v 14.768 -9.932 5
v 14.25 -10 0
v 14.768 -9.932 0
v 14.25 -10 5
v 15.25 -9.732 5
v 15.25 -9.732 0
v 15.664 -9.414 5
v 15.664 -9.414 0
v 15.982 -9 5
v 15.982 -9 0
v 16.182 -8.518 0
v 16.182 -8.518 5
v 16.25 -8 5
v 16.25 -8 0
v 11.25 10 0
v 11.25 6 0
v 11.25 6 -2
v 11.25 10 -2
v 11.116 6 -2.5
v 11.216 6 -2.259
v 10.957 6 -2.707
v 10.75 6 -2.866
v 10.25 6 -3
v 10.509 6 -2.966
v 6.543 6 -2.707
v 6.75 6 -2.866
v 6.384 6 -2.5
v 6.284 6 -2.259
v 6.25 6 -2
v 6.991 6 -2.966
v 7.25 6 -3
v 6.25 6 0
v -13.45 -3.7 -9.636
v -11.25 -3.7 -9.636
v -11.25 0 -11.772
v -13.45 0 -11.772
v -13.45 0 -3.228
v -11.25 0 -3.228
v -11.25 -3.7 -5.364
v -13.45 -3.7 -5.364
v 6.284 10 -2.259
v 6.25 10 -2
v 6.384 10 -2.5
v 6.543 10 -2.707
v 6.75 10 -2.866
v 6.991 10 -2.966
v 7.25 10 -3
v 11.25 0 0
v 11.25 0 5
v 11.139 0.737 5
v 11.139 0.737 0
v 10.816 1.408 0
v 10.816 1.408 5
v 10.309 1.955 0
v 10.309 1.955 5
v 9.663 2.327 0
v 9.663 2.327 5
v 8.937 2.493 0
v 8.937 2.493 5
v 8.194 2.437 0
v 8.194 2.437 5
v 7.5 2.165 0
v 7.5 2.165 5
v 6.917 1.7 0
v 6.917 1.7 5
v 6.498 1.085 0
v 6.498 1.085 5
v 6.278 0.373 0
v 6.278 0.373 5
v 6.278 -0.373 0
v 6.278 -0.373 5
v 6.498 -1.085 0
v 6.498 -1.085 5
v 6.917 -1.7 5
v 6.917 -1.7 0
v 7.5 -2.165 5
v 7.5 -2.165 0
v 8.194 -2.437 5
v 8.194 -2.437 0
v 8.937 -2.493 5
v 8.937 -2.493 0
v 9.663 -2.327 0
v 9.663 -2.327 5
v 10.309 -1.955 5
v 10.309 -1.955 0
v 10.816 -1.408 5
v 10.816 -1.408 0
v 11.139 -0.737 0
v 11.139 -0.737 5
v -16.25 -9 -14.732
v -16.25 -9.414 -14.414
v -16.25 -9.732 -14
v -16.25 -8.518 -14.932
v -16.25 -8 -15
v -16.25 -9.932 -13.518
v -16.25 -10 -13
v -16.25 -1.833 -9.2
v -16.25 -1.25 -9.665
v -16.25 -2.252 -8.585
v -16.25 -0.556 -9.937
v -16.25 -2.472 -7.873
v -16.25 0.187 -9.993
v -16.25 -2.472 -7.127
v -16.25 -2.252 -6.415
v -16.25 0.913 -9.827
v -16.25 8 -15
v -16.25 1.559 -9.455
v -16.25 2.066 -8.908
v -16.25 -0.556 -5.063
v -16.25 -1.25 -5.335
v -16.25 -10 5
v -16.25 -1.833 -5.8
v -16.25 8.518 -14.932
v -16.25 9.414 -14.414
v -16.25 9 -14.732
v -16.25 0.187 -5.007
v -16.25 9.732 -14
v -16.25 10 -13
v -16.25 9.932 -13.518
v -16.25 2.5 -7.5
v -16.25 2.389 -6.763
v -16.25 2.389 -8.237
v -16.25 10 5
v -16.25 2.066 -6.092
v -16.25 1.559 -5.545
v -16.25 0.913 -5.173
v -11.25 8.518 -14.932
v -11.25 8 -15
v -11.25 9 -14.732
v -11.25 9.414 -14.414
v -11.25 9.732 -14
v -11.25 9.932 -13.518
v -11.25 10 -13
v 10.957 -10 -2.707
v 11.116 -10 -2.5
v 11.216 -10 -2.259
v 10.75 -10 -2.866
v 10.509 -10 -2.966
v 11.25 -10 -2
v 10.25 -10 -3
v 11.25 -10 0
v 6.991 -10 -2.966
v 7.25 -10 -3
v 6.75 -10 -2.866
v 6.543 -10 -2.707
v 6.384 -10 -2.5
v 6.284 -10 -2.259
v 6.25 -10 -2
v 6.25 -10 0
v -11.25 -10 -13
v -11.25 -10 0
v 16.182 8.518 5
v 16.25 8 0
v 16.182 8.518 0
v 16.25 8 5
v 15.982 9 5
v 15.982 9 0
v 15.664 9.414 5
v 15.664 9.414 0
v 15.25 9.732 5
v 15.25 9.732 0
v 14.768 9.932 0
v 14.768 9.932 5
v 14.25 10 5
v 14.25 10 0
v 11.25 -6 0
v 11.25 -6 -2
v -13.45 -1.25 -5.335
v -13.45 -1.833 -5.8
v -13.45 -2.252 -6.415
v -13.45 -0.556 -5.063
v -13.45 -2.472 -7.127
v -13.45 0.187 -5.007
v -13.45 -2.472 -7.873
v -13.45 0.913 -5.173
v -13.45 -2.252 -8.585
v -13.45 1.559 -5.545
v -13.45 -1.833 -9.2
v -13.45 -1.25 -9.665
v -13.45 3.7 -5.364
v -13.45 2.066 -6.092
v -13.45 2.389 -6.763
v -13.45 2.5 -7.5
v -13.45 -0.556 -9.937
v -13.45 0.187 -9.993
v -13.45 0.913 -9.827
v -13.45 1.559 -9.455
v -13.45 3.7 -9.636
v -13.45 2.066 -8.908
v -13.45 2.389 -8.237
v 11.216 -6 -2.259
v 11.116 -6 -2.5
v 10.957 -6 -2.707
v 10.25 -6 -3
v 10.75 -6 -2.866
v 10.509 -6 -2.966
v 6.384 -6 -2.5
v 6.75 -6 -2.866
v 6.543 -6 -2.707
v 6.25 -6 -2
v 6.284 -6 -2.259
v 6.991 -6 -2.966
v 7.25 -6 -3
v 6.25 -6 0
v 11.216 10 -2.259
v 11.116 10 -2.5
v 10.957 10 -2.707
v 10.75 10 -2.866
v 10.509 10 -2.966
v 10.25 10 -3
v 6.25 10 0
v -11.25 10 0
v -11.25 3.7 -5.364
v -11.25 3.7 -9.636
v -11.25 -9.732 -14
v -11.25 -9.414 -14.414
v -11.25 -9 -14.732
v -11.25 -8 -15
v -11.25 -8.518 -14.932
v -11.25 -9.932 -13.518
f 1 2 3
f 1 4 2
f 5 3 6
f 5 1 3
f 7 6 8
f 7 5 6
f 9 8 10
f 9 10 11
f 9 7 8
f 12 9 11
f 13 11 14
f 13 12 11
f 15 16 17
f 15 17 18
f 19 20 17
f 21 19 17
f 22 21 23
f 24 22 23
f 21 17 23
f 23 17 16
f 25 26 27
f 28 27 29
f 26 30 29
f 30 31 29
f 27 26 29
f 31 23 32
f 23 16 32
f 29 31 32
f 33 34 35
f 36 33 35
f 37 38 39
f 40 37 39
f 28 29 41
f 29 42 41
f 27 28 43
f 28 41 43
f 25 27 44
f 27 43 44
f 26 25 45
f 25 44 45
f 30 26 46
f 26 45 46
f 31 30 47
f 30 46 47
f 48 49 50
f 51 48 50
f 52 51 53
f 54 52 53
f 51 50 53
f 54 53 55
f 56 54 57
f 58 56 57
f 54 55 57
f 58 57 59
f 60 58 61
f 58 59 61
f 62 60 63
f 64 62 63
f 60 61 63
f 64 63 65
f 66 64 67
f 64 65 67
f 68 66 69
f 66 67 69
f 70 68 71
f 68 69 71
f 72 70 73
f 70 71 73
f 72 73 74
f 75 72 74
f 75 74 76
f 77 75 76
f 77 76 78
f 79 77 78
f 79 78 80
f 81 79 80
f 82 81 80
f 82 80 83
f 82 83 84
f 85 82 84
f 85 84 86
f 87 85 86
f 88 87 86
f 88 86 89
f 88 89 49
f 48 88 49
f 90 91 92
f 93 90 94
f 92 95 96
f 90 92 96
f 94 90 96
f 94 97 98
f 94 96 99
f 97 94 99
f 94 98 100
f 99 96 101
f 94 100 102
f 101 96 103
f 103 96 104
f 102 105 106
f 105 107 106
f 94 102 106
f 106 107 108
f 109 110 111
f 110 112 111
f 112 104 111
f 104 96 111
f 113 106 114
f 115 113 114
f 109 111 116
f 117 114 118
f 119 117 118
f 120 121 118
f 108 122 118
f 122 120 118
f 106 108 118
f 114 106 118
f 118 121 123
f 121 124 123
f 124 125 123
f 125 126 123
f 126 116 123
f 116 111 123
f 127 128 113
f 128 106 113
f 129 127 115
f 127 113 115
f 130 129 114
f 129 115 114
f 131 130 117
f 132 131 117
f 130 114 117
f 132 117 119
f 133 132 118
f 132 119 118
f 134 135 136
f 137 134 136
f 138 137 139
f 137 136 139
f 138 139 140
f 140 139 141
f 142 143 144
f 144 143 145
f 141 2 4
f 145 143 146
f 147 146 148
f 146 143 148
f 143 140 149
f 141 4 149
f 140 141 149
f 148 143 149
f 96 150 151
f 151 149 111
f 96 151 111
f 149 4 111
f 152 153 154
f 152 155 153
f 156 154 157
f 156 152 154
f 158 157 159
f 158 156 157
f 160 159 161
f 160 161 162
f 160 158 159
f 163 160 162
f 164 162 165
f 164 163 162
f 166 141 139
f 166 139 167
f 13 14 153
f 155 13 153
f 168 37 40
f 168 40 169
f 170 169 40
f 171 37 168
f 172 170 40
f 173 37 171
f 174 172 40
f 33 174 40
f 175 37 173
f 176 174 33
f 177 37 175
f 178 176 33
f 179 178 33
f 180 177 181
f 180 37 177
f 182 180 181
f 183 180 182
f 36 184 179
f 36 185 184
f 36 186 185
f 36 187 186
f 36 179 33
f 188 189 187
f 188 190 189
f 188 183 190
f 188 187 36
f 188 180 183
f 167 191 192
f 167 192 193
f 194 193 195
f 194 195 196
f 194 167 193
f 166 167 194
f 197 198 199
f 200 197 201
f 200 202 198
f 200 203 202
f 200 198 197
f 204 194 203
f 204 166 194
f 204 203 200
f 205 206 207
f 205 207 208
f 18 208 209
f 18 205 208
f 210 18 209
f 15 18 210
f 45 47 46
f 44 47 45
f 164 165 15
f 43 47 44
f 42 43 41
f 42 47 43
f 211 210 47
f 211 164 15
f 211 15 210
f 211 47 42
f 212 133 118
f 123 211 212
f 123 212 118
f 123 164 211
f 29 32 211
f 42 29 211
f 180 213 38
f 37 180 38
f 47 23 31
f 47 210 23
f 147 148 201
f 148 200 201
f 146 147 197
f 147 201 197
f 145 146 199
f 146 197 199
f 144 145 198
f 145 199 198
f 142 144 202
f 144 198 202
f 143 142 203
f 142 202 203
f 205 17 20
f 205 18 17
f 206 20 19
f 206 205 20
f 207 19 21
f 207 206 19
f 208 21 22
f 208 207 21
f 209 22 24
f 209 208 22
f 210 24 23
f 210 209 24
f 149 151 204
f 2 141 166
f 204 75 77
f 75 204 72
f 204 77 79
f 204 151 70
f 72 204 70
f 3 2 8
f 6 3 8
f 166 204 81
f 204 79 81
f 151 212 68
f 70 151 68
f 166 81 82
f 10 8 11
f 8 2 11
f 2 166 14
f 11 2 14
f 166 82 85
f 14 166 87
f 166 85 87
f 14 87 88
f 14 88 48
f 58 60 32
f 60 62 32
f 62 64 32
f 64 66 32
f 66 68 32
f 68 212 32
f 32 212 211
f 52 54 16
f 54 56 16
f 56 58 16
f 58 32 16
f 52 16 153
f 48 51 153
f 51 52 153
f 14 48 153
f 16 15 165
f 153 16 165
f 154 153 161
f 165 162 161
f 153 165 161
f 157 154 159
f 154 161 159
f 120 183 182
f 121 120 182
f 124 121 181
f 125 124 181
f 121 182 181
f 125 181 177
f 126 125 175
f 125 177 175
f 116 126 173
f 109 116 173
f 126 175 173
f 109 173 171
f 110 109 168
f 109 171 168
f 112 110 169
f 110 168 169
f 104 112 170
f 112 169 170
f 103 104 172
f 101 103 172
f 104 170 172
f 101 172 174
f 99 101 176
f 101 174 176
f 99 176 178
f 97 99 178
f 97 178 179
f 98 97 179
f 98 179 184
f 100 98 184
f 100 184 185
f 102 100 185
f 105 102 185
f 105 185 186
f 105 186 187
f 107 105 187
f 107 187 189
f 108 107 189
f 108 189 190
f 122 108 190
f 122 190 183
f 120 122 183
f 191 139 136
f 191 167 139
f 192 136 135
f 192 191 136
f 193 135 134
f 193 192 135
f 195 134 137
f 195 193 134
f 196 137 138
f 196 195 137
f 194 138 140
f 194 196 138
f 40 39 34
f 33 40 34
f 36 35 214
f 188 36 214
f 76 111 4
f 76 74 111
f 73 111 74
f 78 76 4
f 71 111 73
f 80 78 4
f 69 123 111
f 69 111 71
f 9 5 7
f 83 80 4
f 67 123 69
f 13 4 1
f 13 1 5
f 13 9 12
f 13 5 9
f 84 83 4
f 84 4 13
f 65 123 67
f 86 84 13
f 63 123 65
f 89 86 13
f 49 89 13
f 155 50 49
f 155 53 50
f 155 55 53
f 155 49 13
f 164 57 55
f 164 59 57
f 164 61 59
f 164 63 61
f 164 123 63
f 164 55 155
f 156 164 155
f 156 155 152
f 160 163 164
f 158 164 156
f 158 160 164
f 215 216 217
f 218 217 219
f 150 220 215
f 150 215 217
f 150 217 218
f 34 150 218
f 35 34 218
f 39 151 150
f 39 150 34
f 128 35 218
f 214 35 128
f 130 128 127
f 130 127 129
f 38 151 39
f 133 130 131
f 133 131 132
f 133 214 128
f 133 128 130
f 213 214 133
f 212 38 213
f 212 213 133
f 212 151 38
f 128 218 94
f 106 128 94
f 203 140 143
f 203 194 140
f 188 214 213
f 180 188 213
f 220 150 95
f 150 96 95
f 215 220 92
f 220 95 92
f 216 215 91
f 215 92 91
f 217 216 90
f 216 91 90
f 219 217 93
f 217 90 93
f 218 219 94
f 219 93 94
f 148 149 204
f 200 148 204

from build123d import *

# Parameters (mm, degrees)
SKETCH1_W           = 32.5
SKETCH1_H           = 20
BOSS_EXTRUDE1_DEPTH = 5
SKETCH2_W           = 5
SKETCH2_H           = 20
BOSS_EXTRUDE2_DEPTH = 15
SKETCH3_R           = 2.5
CUT_EXTRUDE1_DEPTH  = 15
SKETCH4_R           = 2.5
CUT_EXTRUDE2_DEPTH  = 15
SKETCH5_W           = 5
SKETCH5_H           = 4
BOSS_EXTRUDE3_DEPTH = 3
FILLET1_R           = 1
FILLET2_R           = 2
CUT_EXTRUDE3_DEPTH  = 2.2


with BuildPart() as part:
    # Sketch1 → Boss-Extrude1 (new body)
    with BuildSketch(Plane.XY):
        Rectangle(SKETCH1_W, SKETCH1_H)
    extrude(amount=BOSS_EXTRUDE1_DEPTH)

    # Sketch2 → Boss-Extrude2 (add)
    with BuildSketch(Plane(origin=(0, 0, 0), x_dir=(-1, 0, 0), z_dir=(0, 0, -1))):
        with Locations((13.75, 0)):
            Rectangle(SKETCH2_W, SKETCH2_H)
    extrude(amount=BOSS_EXTRUDE2_DEPTH)

    # Sketch3 → Cut-Extrude1 (cut)
    with BuildSketch(Plane(origin=(-11.25, 0, 0), x_dir=(0, 0, -1), z_dir=(1, 0, 0))):
        with Locations(Location((7.5, 0, 0), (0, 0, 90))):
            Circle(SKETCH3_R)
    extrude(amount=-CUT_EXTRUDE1_DEPTH, mode=Mode.SUBTRACT)

    # Sketch4 → Cut-Extrude2 (cut)
    with BuildSketch(Plane.XY.offset(5)):
        with Locations((8.75, 0)):
            Circle(SKETCH4_R)
    extrude(amount=-CUT_EXTRUDE2_DEPTH, mode=Mode.SUBTRACT)

    # Sketch5 → Boss-Extrude3 (add)
    with BuildSketch(Plane(origin=(0, 0, 0), x_dir=(-1, 0, 0), z_dir=(0, 0, -1))):
        with Locations((-8.75, 8)):
            Rectangle(SKETCH5_W, SKETCH5_H)
        with Locations((-8.75, -8)):
            Rectangle(SKETCH5_W, SKETCH5_H)
    extrude(amount=BOSS_EXTRUDE3_DEPTH)

    # Fillet1
    fillet1_edges = [part.edges().sort_by_distance(p)[0] for p in [
        (11.25, 8, -3),
        (6.25, 8, -3),
        (6.25, -8, -3),
        (11.25, -8, -3),
    ]]
    fillet(fillet1_edges, radius=FILLET1_R)

    # Fillet2
    fillet2_edges = [part.edges().sort_by_distance(p)[0] for p in [
        (-13.75, 10, -15),
        (-13.75, -10, -15),
        (16.25, 10, 2.5),
        (16.25, -10, 2.5),
    ]]
    fillet(fillet2_edges, radius=FILLET2_R)

    # Sketch6 → Cut-Extrude3 (cut)
    with BuildSketch(Plane(origin=(-11.25, 0, 0), x_dir=(0, 0, -1), z_dir=(1, 0, 0))):
        Polygon((3.227608008, 0), (5.363804004, -3.7), (9.636195996, -3.7), (11.772391992, 0), (9.636195996, 3.7), (5.363804004, 3.7), align=None)
    extrude(amount=-CUT_EXTRUDE3_DEPTH, mode=Mode.SUBTRACT)


solid = part.part
